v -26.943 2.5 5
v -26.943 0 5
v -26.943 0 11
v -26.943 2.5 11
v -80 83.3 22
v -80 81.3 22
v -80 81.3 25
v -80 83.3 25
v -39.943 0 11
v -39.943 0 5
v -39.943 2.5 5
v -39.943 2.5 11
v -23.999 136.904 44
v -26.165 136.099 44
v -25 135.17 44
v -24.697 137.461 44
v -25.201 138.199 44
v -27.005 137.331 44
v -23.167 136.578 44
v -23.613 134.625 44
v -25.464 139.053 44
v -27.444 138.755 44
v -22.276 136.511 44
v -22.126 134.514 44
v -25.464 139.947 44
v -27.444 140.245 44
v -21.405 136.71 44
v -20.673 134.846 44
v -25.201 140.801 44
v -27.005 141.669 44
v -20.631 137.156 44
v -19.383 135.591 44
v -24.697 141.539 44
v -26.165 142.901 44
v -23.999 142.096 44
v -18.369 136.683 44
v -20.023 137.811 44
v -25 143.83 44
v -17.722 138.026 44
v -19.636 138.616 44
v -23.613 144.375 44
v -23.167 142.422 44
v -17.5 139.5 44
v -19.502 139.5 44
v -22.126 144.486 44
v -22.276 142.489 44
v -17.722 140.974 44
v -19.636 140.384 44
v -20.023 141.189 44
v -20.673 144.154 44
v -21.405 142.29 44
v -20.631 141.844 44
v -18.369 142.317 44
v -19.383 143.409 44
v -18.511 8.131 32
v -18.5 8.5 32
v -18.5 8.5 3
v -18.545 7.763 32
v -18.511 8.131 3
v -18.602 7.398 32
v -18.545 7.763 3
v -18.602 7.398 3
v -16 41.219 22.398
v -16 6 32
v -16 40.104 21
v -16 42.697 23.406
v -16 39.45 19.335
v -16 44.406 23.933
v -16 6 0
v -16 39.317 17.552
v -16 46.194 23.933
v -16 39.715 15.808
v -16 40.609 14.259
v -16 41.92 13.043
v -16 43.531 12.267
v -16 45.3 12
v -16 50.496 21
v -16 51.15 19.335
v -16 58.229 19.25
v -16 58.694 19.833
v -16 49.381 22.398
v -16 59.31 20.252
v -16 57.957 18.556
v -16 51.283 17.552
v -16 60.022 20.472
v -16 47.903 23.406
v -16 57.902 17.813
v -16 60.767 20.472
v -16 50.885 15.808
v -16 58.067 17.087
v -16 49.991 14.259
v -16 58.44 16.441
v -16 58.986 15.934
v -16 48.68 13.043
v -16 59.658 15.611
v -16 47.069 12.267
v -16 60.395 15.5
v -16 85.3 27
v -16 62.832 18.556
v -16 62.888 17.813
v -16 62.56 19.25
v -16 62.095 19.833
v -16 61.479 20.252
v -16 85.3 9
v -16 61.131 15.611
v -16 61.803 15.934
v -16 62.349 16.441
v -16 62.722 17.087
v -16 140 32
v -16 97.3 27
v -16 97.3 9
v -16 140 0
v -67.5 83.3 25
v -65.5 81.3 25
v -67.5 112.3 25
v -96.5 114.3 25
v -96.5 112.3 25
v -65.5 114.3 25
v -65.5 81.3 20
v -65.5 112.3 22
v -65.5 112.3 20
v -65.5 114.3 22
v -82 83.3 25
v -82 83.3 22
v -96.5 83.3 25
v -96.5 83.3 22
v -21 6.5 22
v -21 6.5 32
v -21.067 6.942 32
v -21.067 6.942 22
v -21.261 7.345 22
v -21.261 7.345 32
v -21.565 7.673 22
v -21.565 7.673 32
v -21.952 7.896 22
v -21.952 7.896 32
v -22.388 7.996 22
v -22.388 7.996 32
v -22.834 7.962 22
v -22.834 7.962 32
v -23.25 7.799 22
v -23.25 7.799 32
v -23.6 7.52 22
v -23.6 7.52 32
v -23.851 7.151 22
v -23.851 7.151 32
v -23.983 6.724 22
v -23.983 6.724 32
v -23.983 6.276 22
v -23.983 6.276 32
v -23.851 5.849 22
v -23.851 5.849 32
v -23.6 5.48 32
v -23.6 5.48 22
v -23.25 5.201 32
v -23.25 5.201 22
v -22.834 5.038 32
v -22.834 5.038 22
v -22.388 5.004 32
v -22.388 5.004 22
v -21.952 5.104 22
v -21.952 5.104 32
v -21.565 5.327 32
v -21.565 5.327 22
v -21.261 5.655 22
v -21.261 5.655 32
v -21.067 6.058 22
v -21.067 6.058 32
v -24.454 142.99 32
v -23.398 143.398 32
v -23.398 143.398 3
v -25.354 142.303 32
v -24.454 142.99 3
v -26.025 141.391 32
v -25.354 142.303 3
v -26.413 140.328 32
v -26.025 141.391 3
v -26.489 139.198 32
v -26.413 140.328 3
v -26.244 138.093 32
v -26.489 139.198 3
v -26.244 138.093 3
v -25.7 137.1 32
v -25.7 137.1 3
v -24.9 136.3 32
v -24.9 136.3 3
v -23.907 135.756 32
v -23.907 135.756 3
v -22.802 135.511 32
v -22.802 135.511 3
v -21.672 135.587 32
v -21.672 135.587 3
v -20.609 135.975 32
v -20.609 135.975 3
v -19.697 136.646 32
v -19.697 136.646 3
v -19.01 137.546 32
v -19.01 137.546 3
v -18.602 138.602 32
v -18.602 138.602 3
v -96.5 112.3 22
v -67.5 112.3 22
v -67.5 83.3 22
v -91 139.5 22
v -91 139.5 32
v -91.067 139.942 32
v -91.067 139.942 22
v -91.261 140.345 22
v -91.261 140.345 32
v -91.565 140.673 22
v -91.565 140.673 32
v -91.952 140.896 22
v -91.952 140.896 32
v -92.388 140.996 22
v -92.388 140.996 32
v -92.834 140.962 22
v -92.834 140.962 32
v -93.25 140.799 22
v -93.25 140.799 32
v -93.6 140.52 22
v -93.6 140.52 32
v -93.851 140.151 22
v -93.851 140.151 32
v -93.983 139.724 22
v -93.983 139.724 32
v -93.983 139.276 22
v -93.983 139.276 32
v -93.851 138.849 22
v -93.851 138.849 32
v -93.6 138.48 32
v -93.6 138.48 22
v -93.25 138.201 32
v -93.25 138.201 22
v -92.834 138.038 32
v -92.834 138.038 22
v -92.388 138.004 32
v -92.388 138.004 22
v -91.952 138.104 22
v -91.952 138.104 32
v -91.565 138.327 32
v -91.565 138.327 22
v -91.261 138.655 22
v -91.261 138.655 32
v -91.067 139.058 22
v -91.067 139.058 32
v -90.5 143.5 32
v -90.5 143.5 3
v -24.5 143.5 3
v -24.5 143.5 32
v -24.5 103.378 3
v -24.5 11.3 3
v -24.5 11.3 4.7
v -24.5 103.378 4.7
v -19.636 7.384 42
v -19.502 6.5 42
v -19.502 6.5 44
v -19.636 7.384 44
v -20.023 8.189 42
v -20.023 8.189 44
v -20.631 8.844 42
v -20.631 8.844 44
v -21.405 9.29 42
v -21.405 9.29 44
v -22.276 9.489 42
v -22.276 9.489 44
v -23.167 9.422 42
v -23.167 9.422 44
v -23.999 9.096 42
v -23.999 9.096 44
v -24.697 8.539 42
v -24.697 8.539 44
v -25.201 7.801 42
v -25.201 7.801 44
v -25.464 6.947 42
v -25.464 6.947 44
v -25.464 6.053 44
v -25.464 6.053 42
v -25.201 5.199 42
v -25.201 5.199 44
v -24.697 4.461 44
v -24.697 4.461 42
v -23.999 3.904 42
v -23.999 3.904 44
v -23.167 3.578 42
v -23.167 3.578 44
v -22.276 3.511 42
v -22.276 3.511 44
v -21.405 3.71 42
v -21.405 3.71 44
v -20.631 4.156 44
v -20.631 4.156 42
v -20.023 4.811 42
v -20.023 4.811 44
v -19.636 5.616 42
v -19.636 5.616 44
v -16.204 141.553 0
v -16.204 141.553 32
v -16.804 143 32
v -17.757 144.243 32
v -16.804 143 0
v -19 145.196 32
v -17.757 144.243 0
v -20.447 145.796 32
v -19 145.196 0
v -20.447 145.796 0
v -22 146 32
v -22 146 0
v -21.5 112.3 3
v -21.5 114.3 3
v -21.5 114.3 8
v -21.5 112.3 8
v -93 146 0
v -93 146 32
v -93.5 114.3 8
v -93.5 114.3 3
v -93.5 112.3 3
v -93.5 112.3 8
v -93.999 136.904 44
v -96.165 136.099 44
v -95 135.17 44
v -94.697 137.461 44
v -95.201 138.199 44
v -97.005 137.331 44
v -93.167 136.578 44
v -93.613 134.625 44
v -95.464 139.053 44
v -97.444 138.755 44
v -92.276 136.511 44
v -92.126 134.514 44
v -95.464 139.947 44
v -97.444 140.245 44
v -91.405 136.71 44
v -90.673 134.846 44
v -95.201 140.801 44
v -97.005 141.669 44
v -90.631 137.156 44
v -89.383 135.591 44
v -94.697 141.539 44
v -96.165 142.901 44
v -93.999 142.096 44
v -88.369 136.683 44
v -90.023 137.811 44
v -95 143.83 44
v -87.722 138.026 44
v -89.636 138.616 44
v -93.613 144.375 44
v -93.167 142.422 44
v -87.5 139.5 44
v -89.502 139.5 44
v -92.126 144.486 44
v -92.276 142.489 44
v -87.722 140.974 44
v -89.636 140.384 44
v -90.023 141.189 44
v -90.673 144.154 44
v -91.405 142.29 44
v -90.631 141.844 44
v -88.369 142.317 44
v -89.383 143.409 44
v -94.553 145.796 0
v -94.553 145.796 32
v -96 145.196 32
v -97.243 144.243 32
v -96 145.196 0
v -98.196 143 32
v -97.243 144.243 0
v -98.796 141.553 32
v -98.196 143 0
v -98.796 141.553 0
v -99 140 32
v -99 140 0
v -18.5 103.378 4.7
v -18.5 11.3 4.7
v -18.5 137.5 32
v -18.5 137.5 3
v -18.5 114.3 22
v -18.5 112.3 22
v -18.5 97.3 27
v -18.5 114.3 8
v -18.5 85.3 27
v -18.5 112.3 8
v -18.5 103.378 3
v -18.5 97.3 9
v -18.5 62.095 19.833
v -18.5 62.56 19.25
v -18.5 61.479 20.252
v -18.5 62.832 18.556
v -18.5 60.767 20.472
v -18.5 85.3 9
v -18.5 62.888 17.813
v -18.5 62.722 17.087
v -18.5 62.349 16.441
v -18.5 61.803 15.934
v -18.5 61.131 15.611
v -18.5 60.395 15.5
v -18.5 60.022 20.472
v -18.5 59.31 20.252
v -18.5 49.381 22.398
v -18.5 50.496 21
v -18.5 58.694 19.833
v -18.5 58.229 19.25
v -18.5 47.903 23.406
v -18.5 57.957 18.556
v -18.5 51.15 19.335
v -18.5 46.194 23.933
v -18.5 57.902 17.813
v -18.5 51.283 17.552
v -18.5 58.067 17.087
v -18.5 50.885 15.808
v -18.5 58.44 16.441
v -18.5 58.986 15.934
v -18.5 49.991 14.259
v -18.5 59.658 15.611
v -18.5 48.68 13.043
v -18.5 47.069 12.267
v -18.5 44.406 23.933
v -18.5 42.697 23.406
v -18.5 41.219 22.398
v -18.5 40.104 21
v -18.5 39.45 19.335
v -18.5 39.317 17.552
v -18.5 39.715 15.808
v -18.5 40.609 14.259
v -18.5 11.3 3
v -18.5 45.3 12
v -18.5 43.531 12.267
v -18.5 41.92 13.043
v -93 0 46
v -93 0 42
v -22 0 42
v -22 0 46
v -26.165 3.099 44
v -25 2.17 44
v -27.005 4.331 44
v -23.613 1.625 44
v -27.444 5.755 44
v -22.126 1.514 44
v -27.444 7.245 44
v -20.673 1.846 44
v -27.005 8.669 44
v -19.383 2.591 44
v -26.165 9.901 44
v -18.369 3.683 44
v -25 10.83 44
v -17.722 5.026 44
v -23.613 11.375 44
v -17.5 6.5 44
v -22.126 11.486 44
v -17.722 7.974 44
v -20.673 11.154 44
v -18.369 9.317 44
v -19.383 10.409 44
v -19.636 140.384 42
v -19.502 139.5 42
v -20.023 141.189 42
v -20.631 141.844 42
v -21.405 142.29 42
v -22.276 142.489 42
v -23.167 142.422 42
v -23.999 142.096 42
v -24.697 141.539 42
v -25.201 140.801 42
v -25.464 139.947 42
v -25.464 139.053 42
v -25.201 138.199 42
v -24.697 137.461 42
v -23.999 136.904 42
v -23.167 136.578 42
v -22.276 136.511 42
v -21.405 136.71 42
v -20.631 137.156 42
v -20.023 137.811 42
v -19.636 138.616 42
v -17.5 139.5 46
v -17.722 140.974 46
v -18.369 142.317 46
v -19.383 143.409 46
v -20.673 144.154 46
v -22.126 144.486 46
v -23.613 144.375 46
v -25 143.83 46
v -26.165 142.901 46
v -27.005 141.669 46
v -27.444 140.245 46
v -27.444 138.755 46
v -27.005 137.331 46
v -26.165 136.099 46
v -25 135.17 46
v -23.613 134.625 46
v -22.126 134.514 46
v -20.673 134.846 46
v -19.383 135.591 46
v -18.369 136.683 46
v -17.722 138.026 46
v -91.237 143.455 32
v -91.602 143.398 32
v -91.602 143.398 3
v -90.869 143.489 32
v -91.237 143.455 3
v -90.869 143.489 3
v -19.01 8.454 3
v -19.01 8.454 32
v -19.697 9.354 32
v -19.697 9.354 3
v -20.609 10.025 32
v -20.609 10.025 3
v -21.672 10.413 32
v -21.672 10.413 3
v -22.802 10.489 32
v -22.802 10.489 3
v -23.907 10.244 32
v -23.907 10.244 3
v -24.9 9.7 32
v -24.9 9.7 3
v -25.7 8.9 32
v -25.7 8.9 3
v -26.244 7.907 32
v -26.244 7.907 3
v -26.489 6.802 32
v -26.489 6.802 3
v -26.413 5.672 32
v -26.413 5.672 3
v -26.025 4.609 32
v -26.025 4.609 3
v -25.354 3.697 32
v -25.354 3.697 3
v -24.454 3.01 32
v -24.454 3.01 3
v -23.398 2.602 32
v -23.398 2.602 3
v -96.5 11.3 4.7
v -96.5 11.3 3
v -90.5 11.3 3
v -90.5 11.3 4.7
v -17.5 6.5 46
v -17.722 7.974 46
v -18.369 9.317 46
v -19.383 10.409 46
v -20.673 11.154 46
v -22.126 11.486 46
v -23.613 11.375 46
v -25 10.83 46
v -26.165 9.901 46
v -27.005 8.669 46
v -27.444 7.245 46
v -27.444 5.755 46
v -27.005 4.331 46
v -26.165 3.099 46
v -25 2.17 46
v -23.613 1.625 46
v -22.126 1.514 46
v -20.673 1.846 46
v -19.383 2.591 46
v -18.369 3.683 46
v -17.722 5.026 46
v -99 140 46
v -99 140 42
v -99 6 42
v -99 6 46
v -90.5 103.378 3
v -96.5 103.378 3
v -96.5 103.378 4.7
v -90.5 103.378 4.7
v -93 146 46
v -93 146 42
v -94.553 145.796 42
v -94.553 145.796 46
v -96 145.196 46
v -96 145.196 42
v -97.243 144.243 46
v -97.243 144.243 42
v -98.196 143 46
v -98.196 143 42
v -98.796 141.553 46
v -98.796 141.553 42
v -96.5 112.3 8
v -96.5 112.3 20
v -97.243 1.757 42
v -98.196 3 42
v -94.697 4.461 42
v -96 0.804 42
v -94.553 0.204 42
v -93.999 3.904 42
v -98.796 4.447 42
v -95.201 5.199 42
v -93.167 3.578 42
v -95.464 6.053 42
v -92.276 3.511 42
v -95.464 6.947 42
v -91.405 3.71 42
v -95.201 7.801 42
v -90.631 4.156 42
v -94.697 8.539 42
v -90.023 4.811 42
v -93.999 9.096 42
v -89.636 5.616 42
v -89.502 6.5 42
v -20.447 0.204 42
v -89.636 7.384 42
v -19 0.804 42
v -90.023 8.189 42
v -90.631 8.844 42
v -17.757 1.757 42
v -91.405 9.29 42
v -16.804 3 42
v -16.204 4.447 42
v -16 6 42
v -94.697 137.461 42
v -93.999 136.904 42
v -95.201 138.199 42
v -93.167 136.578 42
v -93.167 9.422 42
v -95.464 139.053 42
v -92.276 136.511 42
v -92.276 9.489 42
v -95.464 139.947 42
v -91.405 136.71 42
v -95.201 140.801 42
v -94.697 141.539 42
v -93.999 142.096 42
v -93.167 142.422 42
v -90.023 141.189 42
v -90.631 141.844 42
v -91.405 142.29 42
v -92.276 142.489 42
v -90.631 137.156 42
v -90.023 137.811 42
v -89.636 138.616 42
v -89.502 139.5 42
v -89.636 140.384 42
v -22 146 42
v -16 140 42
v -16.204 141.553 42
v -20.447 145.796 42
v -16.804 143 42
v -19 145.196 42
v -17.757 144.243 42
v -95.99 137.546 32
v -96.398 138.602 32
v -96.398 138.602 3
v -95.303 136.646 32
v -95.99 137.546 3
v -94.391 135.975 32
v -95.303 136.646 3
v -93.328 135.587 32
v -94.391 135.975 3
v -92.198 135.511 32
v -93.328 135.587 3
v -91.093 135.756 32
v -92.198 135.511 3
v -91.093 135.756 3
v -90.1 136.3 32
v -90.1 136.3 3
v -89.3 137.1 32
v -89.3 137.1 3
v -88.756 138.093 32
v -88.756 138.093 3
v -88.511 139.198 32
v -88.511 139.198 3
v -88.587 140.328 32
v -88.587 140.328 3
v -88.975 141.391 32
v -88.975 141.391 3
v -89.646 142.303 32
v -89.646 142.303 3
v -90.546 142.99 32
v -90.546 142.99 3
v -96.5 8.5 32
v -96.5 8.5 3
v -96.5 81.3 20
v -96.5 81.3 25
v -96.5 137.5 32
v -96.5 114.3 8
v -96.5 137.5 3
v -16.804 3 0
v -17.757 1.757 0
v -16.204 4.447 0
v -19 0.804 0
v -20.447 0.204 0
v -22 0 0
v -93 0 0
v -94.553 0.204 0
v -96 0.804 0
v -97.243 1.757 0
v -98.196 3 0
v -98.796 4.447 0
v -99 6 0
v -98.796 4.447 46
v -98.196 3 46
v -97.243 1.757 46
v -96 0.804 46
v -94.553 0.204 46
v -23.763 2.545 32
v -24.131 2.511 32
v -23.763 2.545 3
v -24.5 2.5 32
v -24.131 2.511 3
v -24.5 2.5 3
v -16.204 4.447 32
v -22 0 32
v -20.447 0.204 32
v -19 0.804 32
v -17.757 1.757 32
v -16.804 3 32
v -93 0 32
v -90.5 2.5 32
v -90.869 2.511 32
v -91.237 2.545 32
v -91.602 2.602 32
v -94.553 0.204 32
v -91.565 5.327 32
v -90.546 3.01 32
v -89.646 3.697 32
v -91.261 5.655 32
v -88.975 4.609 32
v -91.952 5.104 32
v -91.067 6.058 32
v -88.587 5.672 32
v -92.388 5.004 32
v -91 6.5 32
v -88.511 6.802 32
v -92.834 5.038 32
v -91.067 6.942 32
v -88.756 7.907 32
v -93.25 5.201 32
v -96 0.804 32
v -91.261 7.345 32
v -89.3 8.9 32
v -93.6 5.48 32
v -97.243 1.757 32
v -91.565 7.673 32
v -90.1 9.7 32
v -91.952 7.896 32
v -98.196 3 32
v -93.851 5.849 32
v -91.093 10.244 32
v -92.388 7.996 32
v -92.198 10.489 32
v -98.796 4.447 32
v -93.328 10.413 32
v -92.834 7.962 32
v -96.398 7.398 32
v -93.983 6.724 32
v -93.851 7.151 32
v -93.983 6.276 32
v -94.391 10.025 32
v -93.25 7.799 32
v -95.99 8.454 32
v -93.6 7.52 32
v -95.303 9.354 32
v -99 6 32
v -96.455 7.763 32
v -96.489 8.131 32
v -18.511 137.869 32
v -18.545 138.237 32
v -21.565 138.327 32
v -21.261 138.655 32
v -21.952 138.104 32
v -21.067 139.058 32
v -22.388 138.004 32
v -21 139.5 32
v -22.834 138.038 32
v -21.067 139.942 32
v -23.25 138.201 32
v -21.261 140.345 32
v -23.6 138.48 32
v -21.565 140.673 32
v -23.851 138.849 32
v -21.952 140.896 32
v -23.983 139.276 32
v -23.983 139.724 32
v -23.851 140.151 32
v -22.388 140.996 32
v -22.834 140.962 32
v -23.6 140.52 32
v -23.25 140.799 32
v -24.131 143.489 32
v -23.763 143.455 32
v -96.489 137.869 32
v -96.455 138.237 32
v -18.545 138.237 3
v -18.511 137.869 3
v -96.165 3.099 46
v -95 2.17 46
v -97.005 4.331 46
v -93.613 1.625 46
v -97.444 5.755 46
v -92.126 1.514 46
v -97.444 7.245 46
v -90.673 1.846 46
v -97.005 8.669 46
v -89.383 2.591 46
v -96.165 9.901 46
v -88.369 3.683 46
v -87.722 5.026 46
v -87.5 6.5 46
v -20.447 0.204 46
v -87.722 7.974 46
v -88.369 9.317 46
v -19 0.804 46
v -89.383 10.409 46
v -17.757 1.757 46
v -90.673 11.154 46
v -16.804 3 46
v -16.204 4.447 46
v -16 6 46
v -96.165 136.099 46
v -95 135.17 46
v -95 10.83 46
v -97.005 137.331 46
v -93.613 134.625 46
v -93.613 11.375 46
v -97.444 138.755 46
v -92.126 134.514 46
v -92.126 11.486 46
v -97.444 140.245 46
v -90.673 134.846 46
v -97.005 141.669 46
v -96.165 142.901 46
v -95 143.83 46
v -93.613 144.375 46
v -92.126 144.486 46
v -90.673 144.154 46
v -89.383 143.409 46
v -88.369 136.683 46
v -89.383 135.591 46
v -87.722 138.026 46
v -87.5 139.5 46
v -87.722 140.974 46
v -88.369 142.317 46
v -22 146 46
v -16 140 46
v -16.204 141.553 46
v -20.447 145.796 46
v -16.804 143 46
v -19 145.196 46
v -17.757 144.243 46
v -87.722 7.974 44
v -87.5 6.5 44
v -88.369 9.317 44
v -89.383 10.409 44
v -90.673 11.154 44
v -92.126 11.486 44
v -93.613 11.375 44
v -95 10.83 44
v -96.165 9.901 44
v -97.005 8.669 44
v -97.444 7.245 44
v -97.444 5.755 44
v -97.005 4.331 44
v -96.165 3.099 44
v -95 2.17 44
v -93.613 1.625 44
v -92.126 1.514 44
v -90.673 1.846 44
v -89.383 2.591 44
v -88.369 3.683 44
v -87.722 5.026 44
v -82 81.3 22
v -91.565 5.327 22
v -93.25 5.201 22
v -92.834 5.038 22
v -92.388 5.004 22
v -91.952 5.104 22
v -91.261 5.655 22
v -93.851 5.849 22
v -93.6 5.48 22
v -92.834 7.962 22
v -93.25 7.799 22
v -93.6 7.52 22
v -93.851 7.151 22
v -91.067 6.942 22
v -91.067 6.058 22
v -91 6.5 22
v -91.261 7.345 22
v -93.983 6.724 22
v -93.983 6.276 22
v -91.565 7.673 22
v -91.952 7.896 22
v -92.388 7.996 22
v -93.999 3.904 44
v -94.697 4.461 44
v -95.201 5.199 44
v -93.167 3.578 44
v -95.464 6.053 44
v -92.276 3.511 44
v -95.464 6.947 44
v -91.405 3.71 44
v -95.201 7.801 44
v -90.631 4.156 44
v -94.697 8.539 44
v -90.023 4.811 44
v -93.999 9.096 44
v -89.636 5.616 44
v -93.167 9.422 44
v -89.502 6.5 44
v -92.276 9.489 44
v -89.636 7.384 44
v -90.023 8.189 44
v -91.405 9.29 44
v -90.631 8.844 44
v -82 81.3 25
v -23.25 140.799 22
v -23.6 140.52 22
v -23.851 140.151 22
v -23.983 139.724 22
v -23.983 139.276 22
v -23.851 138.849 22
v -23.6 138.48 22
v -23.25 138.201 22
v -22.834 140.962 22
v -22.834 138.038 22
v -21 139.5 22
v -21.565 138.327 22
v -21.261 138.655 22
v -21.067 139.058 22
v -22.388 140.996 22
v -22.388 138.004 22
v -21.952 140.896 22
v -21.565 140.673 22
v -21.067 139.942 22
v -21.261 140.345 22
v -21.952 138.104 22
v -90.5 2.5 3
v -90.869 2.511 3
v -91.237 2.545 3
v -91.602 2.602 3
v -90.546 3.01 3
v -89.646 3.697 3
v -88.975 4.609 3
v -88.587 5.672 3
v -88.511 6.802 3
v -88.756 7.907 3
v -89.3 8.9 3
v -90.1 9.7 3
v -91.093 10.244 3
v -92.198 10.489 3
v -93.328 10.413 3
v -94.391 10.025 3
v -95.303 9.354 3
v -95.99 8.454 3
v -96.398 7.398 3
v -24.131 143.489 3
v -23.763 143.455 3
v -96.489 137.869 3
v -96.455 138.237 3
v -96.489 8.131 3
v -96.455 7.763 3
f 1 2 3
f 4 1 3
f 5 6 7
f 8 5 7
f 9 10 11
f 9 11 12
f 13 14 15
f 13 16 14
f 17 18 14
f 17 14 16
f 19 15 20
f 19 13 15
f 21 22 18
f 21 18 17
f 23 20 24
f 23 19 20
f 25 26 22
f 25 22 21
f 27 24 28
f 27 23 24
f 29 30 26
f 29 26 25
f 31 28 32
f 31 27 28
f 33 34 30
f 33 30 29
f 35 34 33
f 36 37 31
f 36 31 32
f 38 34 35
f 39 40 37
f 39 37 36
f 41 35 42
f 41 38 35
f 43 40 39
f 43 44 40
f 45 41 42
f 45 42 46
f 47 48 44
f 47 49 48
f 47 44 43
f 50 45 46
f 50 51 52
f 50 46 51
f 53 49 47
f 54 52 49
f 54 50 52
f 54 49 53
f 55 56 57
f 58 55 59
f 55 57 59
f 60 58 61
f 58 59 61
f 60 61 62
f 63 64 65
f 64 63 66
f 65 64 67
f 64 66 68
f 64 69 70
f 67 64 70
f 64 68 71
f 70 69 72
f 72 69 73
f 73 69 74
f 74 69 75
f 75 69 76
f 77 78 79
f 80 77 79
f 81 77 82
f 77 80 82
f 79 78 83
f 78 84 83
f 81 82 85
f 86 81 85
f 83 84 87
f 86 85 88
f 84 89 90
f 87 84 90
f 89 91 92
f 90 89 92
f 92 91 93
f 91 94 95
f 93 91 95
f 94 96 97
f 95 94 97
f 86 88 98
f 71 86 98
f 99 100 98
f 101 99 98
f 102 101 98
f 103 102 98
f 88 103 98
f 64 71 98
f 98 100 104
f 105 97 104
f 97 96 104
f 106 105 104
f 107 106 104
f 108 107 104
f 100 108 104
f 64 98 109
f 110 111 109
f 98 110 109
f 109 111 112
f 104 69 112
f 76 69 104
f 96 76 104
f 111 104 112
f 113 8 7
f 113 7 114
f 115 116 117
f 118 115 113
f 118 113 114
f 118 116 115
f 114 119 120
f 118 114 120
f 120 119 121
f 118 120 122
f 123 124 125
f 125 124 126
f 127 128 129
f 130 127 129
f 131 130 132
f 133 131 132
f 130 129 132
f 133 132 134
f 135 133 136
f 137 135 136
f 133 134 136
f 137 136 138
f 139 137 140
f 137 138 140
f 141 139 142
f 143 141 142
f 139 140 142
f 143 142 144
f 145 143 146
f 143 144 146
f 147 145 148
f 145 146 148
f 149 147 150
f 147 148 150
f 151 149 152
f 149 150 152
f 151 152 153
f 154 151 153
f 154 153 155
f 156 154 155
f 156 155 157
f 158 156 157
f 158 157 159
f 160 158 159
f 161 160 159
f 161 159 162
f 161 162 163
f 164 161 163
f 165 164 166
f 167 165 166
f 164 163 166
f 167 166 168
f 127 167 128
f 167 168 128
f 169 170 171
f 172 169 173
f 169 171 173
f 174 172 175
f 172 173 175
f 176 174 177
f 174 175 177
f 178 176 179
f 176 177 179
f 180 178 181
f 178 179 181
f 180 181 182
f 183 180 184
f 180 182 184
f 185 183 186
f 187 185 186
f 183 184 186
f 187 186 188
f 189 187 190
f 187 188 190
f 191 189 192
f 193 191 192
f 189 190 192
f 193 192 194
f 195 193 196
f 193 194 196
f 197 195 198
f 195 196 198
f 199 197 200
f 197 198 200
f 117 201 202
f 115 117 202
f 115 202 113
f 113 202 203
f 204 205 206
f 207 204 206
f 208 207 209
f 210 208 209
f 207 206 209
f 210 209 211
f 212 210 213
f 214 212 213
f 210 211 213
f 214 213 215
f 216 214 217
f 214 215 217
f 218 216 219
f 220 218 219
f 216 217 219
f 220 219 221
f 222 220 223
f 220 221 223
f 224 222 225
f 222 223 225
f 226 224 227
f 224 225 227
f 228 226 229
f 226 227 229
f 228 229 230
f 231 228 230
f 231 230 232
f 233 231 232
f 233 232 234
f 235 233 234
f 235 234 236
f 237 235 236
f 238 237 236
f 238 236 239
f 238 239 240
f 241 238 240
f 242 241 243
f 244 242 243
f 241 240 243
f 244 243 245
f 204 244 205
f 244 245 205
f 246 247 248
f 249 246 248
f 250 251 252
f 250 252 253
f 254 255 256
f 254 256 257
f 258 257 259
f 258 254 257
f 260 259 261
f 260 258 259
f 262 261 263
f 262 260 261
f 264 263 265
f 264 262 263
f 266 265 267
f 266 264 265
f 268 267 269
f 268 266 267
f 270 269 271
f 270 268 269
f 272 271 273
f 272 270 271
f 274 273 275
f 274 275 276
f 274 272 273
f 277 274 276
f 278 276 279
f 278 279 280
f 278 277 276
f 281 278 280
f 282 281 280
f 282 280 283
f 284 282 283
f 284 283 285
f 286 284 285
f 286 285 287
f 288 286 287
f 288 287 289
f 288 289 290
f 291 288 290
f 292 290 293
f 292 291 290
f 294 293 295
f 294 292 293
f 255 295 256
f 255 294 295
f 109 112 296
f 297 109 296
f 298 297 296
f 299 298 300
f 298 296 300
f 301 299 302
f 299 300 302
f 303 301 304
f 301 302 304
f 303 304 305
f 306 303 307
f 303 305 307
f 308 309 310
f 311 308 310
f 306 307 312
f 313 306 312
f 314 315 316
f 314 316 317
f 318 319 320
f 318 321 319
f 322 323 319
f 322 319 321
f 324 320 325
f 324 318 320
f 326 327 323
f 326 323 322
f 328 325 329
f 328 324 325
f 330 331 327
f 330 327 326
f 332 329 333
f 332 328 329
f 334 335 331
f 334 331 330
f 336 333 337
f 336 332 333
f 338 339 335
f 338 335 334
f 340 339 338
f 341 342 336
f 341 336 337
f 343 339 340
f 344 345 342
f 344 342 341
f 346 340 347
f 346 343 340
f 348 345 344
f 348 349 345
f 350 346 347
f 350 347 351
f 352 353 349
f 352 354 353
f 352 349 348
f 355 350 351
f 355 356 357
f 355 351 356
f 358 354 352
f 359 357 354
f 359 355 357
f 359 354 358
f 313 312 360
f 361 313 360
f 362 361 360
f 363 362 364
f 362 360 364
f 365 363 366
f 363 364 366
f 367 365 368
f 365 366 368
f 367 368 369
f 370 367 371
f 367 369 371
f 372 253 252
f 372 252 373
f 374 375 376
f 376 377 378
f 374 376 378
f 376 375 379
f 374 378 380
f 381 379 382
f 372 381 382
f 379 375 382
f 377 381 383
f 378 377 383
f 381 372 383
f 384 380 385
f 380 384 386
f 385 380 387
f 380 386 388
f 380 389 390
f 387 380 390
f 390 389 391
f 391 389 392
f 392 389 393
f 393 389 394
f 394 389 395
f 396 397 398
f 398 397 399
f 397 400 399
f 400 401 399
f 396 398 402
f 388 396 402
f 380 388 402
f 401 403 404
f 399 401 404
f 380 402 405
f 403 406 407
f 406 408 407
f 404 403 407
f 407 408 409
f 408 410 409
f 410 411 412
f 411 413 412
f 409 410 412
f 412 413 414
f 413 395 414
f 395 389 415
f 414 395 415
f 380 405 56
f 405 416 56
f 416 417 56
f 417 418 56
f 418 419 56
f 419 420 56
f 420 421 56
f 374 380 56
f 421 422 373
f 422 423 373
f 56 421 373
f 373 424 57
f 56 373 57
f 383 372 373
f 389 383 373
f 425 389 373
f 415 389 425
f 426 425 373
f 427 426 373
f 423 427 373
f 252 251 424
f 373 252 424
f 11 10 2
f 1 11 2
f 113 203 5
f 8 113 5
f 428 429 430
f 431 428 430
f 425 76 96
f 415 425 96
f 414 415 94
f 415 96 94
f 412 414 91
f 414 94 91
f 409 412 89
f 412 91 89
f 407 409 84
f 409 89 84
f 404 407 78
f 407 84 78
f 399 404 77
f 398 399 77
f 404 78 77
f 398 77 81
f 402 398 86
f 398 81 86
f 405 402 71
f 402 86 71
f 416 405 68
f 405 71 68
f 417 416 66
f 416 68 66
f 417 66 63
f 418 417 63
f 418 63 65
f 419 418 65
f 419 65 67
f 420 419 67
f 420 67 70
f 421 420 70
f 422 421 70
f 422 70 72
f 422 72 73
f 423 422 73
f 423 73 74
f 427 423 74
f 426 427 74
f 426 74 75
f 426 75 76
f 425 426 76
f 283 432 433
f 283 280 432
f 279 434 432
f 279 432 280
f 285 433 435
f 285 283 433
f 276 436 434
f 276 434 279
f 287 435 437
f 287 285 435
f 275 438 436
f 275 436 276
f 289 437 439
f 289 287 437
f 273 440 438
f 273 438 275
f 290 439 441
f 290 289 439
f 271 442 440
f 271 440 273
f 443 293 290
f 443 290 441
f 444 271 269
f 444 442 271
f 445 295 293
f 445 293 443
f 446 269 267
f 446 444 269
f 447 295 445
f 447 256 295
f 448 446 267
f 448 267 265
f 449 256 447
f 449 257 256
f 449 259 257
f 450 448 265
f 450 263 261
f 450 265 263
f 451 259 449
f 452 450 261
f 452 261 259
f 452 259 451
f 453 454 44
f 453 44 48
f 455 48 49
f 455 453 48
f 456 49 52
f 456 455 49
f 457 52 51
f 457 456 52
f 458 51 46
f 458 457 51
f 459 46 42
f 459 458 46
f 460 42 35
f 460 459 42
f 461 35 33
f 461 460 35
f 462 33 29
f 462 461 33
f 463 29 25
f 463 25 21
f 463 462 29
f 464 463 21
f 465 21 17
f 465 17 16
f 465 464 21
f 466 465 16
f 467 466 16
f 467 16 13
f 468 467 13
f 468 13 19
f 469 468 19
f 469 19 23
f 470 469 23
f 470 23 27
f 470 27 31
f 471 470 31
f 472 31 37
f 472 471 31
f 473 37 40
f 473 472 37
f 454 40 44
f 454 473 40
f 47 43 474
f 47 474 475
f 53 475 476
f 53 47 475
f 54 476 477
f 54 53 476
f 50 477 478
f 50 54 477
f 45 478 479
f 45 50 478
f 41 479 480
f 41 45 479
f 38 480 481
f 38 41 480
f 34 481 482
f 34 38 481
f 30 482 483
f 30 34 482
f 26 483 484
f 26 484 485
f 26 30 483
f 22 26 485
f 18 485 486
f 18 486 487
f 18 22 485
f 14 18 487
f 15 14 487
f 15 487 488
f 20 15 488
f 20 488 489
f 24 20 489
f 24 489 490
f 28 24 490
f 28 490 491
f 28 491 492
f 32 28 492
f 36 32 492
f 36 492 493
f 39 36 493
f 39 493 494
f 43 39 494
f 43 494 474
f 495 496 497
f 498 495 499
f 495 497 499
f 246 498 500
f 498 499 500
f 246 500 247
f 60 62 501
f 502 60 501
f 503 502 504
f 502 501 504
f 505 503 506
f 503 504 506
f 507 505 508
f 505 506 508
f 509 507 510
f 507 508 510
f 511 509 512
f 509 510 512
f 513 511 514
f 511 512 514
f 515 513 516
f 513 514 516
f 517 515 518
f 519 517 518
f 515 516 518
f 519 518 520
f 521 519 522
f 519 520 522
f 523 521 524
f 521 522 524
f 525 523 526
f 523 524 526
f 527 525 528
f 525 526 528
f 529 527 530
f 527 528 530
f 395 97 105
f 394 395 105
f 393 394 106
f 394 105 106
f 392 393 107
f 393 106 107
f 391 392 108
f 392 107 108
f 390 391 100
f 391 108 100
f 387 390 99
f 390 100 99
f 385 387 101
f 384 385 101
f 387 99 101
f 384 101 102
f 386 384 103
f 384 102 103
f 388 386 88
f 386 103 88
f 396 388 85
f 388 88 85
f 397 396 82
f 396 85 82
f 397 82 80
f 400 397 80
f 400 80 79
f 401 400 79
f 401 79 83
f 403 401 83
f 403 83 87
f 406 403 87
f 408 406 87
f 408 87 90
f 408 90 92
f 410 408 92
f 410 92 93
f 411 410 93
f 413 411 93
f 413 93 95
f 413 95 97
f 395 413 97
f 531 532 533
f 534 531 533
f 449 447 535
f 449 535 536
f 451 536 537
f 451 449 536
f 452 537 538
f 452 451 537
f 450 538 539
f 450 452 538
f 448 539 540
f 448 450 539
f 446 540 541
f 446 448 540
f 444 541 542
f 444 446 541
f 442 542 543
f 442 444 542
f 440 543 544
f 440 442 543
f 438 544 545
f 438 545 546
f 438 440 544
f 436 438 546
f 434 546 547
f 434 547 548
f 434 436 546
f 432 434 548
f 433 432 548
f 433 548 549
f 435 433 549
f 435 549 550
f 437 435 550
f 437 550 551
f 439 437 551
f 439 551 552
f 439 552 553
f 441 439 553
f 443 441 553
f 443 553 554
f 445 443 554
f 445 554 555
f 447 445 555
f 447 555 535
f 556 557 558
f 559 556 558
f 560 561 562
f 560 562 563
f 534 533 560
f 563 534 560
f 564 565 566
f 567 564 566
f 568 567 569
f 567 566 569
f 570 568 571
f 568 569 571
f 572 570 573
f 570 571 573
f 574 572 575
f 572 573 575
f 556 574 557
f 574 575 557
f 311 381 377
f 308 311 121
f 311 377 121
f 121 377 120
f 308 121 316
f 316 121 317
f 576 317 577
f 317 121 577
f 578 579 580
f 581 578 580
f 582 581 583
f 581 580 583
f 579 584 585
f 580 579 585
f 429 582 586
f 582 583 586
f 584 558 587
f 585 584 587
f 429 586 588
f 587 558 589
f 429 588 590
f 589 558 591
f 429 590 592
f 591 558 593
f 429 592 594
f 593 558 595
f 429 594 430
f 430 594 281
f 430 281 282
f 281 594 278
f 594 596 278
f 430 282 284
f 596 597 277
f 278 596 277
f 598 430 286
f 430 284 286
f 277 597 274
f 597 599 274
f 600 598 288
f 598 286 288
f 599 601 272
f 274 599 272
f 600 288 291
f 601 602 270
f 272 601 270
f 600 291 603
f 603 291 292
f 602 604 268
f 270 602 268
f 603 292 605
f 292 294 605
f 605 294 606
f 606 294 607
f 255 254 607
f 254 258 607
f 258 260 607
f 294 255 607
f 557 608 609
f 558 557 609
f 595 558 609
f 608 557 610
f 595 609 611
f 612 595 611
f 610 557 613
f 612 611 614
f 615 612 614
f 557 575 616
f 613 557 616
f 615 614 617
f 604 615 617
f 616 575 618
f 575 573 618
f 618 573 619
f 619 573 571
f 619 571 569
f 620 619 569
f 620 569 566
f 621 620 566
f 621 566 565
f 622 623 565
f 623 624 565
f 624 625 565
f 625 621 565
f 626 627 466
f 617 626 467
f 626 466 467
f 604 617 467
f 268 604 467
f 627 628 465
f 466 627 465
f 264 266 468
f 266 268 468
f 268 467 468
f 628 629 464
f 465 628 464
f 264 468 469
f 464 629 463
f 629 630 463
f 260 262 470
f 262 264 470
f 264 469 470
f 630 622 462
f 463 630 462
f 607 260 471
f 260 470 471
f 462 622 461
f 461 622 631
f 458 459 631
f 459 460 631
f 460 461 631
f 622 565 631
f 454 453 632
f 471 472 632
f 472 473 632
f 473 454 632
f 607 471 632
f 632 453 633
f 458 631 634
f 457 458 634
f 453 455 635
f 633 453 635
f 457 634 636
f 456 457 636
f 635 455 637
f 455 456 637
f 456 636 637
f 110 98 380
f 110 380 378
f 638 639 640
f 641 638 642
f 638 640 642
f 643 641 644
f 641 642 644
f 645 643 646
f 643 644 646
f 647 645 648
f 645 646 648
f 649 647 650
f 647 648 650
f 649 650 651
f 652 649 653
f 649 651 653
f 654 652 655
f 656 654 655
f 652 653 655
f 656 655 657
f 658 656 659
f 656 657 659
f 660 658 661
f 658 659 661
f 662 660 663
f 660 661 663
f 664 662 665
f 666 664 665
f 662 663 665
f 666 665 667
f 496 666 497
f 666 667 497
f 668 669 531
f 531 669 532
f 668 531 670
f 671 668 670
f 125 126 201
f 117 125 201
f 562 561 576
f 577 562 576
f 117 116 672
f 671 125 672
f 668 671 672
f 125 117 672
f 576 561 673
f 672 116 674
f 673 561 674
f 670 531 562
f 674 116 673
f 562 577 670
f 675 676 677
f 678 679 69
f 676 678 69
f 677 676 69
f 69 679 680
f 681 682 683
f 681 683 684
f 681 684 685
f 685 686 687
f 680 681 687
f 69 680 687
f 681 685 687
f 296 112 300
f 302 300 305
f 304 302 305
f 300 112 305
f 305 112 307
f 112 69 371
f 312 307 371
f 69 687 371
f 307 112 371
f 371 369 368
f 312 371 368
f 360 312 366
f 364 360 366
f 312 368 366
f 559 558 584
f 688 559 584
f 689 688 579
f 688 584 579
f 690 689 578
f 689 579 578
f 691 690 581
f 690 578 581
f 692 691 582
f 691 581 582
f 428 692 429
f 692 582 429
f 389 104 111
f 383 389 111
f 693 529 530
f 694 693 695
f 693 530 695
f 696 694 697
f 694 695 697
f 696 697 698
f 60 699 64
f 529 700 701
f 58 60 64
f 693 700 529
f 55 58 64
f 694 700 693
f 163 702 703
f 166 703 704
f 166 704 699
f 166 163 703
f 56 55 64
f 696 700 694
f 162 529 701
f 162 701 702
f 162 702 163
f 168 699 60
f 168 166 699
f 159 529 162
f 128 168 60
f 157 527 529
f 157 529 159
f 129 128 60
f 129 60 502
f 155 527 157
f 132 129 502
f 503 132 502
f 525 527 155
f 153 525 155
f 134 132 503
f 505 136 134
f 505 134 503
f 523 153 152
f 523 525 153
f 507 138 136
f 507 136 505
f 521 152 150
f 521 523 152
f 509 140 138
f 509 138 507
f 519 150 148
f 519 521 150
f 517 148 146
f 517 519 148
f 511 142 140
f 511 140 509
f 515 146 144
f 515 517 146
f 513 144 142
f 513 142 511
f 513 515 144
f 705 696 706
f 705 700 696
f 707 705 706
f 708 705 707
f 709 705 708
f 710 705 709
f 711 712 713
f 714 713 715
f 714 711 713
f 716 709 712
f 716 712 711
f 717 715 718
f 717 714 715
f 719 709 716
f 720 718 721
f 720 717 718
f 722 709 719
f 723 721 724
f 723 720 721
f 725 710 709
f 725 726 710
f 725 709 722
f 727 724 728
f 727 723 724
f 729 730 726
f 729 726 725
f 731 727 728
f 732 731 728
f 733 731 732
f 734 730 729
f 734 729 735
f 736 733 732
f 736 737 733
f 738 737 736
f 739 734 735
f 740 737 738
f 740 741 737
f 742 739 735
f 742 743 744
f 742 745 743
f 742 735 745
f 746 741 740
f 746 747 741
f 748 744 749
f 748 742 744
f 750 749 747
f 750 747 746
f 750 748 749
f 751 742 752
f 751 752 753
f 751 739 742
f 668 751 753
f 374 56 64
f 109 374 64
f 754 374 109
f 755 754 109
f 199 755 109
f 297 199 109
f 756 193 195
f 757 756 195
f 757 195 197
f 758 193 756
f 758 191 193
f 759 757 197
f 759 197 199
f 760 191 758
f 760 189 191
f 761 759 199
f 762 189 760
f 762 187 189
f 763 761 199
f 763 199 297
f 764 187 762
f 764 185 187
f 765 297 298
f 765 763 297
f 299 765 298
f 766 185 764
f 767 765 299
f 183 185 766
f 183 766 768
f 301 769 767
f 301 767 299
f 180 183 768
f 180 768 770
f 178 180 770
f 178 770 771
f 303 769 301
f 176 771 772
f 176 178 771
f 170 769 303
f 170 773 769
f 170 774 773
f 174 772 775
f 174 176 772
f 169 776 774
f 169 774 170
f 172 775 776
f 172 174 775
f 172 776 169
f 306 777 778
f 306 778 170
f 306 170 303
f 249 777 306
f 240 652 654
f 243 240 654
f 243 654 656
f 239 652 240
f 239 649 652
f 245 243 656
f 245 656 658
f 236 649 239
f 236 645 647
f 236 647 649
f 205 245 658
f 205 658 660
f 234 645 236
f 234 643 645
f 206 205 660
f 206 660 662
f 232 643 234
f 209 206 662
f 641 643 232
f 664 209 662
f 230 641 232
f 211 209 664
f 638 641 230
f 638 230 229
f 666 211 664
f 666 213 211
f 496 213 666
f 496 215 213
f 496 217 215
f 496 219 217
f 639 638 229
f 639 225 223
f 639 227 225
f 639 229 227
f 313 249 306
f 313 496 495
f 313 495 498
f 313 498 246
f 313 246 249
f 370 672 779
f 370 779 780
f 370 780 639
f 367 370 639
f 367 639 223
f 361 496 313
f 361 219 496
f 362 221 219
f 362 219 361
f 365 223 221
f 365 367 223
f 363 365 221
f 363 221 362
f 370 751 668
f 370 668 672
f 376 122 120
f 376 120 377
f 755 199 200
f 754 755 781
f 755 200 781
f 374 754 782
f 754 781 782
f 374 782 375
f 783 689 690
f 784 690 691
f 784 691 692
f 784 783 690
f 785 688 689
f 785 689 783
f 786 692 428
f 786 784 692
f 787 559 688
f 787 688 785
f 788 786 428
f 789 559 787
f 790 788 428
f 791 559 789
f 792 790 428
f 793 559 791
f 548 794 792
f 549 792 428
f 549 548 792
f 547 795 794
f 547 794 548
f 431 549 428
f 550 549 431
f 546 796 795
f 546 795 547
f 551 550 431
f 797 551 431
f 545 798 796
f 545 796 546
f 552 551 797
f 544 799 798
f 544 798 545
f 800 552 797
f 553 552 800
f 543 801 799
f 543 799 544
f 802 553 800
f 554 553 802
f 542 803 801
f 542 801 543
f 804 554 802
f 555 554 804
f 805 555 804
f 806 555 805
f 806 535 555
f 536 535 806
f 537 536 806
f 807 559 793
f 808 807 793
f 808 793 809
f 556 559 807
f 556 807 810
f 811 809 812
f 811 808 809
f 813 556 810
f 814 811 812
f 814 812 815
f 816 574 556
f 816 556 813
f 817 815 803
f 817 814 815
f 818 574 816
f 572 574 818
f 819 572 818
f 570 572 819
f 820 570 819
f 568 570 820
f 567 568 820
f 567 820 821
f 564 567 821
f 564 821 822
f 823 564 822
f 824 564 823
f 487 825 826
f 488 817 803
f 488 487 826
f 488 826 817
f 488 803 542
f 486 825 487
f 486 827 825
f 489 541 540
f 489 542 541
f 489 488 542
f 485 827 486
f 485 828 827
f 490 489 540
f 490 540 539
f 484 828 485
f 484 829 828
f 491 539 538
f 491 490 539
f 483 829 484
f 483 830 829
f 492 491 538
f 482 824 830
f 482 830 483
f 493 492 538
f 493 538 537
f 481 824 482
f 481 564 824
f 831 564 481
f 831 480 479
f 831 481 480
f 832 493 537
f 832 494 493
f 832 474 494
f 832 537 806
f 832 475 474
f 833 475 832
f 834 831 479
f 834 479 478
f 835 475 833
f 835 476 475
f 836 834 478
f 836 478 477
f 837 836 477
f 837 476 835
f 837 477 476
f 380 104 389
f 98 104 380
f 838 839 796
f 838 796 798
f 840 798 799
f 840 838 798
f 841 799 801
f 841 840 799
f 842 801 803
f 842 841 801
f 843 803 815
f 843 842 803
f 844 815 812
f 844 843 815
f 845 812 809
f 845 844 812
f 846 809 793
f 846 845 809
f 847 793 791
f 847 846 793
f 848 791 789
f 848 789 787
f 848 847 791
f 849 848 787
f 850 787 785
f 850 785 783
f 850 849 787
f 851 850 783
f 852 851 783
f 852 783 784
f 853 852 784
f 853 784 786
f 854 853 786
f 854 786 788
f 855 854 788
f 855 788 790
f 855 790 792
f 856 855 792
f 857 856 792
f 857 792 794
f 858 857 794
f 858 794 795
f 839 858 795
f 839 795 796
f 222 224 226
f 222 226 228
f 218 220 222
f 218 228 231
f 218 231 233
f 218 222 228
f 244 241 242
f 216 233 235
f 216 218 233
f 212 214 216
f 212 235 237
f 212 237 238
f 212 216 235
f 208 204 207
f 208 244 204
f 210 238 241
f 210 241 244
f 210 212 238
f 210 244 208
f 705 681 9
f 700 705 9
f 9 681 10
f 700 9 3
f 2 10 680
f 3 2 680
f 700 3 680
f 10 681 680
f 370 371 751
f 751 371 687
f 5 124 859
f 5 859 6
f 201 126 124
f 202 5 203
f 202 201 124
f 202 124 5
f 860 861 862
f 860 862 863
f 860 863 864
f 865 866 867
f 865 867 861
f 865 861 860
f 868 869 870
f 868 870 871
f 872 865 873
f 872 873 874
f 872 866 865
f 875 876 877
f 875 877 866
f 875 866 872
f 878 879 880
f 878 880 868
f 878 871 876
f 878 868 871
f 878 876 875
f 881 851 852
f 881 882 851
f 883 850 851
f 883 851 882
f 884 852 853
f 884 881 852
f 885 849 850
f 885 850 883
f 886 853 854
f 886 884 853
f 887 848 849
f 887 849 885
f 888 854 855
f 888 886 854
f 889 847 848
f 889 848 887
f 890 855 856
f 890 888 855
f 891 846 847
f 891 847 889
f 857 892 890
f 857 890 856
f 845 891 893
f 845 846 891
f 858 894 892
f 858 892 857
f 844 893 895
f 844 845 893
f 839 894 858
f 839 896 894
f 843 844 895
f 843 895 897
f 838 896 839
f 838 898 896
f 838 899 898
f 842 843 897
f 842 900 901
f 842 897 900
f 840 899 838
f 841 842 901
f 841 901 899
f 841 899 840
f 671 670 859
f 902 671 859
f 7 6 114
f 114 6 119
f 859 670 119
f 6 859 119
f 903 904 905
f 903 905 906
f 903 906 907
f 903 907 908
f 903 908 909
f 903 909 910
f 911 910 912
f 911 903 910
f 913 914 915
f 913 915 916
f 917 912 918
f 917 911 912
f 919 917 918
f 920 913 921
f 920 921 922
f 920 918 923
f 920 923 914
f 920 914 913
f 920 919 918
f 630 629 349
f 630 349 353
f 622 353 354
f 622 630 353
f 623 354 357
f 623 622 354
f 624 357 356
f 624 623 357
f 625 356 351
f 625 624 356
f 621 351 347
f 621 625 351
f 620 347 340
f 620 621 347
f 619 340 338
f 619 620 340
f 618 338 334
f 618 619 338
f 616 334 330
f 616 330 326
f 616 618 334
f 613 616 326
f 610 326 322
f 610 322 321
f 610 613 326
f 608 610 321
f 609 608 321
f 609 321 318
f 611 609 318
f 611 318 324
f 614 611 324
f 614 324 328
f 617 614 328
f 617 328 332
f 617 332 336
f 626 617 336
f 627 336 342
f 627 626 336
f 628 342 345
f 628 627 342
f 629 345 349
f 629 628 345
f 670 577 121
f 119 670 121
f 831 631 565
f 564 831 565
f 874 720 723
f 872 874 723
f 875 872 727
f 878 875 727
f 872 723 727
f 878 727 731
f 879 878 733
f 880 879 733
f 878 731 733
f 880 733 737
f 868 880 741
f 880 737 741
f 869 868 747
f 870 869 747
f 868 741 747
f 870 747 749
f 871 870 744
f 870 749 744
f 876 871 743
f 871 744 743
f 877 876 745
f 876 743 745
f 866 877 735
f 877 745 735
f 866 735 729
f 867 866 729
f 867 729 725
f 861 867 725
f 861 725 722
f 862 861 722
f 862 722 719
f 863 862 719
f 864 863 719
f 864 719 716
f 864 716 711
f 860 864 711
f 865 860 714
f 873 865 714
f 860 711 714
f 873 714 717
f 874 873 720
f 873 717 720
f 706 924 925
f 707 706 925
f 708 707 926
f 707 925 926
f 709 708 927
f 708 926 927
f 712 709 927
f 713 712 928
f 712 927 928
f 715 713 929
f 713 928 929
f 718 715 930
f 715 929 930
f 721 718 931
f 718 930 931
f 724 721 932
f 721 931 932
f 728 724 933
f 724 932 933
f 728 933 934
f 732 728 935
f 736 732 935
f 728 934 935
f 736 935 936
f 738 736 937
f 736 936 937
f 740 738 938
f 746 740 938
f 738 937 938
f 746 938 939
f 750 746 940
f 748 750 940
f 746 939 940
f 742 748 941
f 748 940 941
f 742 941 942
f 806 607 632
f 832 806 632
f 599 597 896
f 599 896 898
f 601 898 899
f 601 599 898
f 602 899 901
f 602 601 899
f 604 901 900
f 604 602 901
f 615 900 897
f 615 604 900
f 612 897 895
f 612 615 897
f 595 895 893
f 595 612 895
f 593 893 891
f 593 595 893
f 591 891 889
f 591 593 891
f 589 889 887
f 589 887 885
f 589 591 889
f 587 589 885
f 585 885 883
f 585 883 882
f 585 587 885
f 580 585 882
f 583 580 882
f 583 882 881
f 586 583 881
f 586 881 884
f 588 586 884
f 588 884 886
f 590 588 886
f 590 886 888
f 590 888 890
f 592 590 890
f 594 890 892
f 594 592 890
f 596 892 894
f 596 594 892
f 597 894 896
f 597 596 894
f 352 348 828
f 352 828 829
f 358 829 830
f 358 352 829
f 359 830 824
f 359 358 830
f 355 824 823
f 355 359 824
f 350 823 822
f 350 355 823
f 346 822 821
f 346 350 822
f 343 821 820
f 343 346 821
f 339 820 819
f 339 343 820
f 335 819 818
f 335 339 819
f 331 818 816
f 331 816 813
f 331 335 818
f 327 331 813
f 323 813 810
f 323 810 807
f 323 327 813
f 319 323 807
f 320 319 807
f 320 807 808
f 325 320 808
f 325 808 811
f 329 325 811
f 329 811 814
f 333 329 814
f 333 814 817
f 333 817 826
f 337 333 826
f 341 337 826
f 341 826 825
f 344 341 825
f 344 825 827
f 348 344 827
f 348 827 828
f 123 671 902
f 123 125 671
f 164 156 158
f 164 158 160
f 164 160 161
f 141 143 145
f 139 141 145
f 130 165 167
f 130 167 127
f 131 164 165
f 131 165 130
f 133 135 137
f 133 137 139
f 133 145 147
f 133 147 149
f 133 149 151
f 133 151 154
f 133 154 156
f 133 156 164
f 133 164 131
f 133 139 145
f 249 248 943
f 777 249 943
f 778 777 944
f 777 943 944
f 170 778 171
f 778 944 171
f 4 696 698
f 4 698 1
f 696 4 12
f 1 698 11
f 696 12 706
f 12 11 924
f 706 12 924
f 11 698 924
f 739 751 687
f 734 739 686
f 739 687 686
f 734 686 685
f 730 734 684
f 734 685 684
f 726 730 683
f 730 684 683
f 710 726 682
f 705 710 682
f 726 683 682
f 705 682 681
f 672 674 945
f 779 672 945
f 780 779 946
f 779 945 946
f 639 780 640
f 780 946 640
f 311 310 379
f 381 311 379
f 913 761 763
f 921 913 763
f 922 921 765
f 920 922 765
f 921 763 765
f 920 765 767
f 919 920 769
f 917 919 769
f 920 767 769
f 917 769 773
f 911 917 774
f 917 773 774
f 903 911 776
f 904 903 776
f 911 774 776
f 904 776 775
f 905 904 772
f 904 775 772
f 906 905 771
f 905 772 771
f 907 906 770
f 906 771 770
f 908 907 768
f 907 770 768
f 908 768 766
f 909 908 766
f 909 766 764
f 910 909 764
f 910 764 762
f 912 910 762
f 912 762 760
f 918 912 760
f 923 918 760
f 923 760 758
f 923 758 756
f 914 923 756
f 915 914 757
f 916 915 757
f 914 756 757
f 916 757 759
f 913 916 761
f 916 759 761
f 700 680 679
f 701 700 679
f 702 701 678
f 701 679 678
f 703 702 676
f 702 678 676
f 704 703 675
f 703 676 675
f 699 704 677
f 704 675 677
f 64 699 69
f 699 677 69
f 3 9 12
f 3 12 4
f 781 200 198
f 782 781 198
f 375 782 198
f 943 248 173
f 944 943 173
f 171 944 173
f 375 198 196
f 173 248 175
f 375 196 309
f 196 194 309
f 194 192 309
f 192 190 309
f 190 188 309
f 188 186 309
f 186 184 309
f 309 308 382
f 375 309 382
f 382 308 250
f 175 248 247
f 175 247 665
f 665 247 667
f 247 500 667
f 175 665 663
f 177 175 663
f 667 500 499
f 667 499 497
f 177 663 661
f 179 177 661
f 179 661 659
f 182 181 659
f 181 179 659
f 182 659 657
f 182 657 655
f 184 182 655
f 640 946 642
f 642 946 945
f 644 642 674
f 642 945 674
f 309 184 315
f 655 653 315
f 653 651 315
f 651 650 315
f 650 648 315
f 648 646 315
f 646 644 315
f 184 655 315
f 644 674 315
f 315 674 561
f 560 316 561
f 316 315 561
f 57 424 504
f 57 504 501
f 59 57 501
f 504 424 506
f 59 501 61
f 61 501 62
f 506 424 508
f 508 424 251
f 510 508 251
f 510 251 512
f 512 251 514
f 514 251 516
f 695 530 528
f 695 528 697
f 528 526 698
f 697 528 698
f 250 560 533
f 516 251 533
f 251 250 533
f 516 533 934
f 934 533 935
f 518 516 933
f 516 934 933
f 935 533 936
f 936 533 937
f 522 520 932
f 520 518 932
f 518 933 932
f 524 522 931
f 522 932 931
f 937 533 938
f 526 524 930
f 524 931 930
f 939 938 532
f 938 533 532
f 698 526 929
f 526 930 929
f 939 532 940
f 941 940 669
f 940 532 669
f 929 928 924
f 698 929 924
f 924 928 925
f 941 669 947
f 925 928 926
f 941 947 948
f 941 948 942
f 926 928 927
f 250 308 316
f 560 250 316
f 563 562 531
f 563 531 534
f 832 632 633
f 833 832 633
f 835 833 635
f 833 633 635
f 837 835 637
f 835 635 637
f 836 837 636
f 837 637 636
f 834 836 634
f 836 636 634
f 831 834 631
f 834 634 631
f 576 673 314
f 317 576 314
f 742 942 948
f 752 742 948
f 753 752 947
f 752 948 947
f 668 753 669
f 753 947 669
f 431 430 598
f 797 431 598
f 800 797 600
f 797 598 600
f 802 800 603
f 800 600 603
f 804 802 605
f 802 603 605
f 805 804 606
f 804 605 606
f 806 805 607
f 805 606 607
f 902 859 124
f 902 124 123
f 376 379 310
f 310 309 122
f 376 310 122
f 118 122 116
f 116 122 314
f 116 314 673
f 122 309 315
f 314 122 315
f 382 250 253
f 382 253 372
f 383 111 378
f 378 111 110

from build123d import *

# Parameters (mm, degrees)
BOX_BASE_DEPTH              = 3
BOX_WALLS_DEPTH             = 32
SCREW_PLATFORMS_DEPTH       = 32
BATTERY_START               = 10
BATTERY_COMPARTMENT_DEPTH   = 19
CUT_EXTRUDE1_DEPTH          = 3
CUT_EXTRUDE1_DEPTH_BACK     = 6
SKETCH5_W                   = 3
SKETCH5_H                   = 5
BOX_START                   = 10
SKETCH6_R                   = 5
BOX_COVER_DEPTH             = 4
BOSS_EXTRUDE11_START        = 10
SKETCH6_3_R                 = 5
SKETCH6_3_R_2               = 2.99754368
BOSS_EXTRUDE11_DEPTH        = 2
SKETCH8_W                   = 6
SKETCH8_H                   = 92.078446576
REST_PLATFORM_DEPTH         = 1.7
SKETCH9_R                   = 6
SKETCH9_R_2                 = 2.5
SKETCH9_W                   = 12
SKETCH9_H                   = 18
BUTTTON_HOLES_DEPTH         = 4
SKETCH10_W                  = 13
SKETCH10_H                  = 6
FAKE_USB_DEPTH              = 4
GPS_START                   = -10
SKETCH11_W                  = 29
SKETCH11_H                  = 29
GPS_ANTENNA_BOX_DEPTH       = 2
GPS_START_2                 = -12
GPS_ANTENNA_BOX_WALLS_DEPTH = 5
SKETCH12_W                  = 2
SKETCH12_H                  = 3
CUT_EXTRUDE4_DEPTH          = 4
SKETCH6_4_R                 = 1.5
CUT_EXTRUDE5_DEPTH          = 10


with BuildPart() as part:
    # Sketch2 → box base (new body)
    with BuildSketch(Plane(origin=(0, 0, 0), x_dir=(0, 1, 0), z_dir=(0, 0, 1))):
        with BuildLine():
            Line((2.5, 24.5), (2.5, 90.5))
            ThreePointArc((2.5, 90.5), (4.257359313, 94.742640687), (8.5, 96.5))
            Line((8.5, 96.5), (137.5, 96.5))
            ThreePointArc((137.5, 96.5), (141.742640687, 94.742640687), (143.5, 90.5))
            Line((143.5, 90.5), (143.5, 24.5))
            ThreePointArc((143.5, 24.5), (141.742640687, 20.257359313), (137.5, 18.5))
            Line((137.5, 18.5), (8.5, 18.5))
            ThreePointArc((8.5, 18.5), (4.257359313, 20.257359313), (2.5, 24.5))
        make_face()
    extrude(amount=BOX_BASE_DEPTH)

    # Sketch2<3> → box walls (add)
    with BuildSketch(Plane(origin=(0, 0, 0), x_dir=(0, 1, 0), z_dir=(0, 0, 1))):
        with BuildLine():
            Line((6, 16), (140, 16))
            ThreePointArc((140, 16), (144.242640687, 17.757359313), (146, 22))
            Line((146, 22), (146, 93))
            ThreePointArc((146, 93), (144.242640687, 97.242640687), (140, 99))
            Line((140, 99), (6, 99))
            ThreePointArc((6, 99), (1.757359313, 97.242640687), (0, 93))
            Line((0, 93), (0, 22))
            ThreePointArc((0, 22), (1.757359313, 17.757359313), (6, 16))
        make_face()
        with BuildLine():
            Line((2.5, 24.5), (2.5, 90.5))
            ThreePointArc((2.5, 90.5), (4.257359313, 94.742640687), (8.5, 96.5))
            Line((8.5, 96.5), (137.5, 96.5))
            ThreePointArc((137.5, 96.5), (141.742640687, 94.742640687), (143.5, 90.5))
            Line((143.5, 90.5), (143.5, 24.5))
            ThreePointArc((143.5, 24.5), (141.742640687, 20.257359313), (137.5, 18.5))
            Line((137.5, 18.5), (8.5, 18.5))
            ThreePointArc((8.5, 18.5), (4.257359313, 20.257359313), (2.5, 24.5))
        make_face(mode=Mode.SUBTRACT)
    extrude(amount=BOX_WALLS_DEPTH)

    # Sketch2<4> → screw platforms (add)
    with BuildSketch(Plane(origin=(0, 0, 0), x_dir=(0, 1, 0), z_dir=(0, 0, 1))):
        with BuildLine():
            ThreePointArc((7.397915762, 96.397915762), (4.257359313, 94.742640687), (2.602084238, 91.602084238))
            ThreePointArc((2.602084238, 91.602084238), (9.328427125, 89.671572875), (7.397915762, 96.397915762))
        make_face()
        with BuildLine():
            ThreePointArc((7.397915762, 18.602084238), (9.328427125, 25.328427125), (2.602084238, 23.397915762))
            ThreePointArc((2.602084238, 23.397915762), (4.257359313, 20.257359313), (7.397915762, 18.602084238))
        make_face()
        with BuildLine():
            ThreePointArc((143.397915762, 91.602084238), (141.742640687, 94.742640687), (138.602084238, 96.397915762))
            ThreePointArc((138.602084238, 96.397915762), (136.671572875, 89.671572875), (143.397915762, 91.602084238))
        make_face()
        with BuildLine():
            ThreePointArc((143.397915762, 23.397915762), (136.671572875, 25.328427125), (138.602084238, 18.602084238))
            ThreePointArc((138.602084238, 18.602084238), (141.742640687, 20.257359313), (143.397915762, 23.397915762))
        make_face()
    extrude(amount=SCREW_PLATFORMS_DEPTH)

    # Sketch3 → battery compartment (add)
    with BuildSketch(Plane(origin=(-67, 0, 32), x_dir=(0, -1, 0), z_dir=(0, 0, -1)).offset(BATTERY_START)):
        Polygon((-114.3, -45.238614765), (-114.3, -48.5), (-112.3, -48.5), (-112.3, 29.5), (-114.3, 29.5), align=None)
    extrude(amount=BATTERY_COMPARTMENT_DEPTH)

    # Sketch5 → Cut-Extrude1 (cut, two sides: drawn at the far end of the back side and taken through both)
    with BuildSketch(Plane.XZ.offset(-112.3).offset(-CUT_EXTRUDE1_DEPTH_BACK)):
        with Locations((-95, 5.5)):
            Rectangle(SKETCH5_W, SKETCH5_H)
        with Locations((-20, 5.5)):
            Rectangle(SKETCH5_W, SKETCH5_H)
    extrude(amount=CUT_EXTRUDE1_DEPTH + CUT_EXTRUDE1_DEPTH_BACK, mode=Mode.SUBTRACT)

    # Sketch8 → rest platform (add)
    with BuildSketch(Plane.XY.offset(3)):
        with Locations((-21.5, 57.339223288)):
            Rectangle(SKETCH8_W, SKETCH8_H)
        with Locations((-93.5, 57.339223288)):
            Rectangle(SKETCH8_W, SKETCH8_H)
    extrude(amount=REST_PLATFORM_DEPTH)

    # Sketch9 → buttton holes (cut)
    with BuildSketch(Plane.YZ.offset(-16)):
        with Locations(Location((45.3, 18, 0), (0, 0, 270))):
            Circle(SKETCH9_R)
        with Locations(Location((60.394515887, 18, 0), (0, 0, 270))):
            Circle(SKETCH9_R_2)
        with Locations((91.3, 18)):
            Rectangle(SKETCH9_W, SKETCH9_H)
    extrude(amount=-BUTTTON_HOLES_DEPTH, mode=Mode.SUBTRACT)

    # Sketch10 → fake usb (cut)
    with BuildSketch(Plane.XZ):
        with Locations((-33.442978121, 8)):
            Rectangle(SKETCH10_W, SKETCH10_H)
    extrude(amount=-FAKE_USB_DEPTH, mode=Mode.SUBTRACT)

    # Sketch11 → gps antenna box (add)
    with BuildSketch(Plane.XY.offset(32).offset(GPS_START)):
        with Locations((-82, 97.8)):
            Rectangle(SKETCH11_W, SKETCH11_H)
    extrude(amount=-GPS_ANTENNA_BOX_DEPTH)

    # Sketch11<4> → gps antenna box walls (add)
    with BuildSketch(Plane.XY.offset(32).offset(GPS_START_2)):
        Polygon((-96.5, 114.3), (-96.5, 112.3), (-67.5, 112.3), (-67.5, 83.3), (-96.5, 83.3), (-96.5, 81.3), (-65.5, 81.3), (-65.5, 112.3), (-65.5, 114.3), (-67.5, 114.3), align=None)
    extrude(amount=GPS_ANTENNA_BOX_WALLS_DEPTH)

    # Sketch12 → Cut-Extrude4 (cut)
    with BuildSketch(Plane.XZ.offset(-81.3)):
        with Locations((-81, 23.5)):
            Rectangle(SKETCH12_W, SKETCH12_H)
    extrude(amount=-CUT_EXTRUDE4_DEPTH, mode=Mode.SUBTRACT)

    # Sketch6<4> → Cut-Extrude5 (cut)
    with BuildSketch(Plane.XY.offset(32)):
        with Locations((-92.5, 139.5)):
            Circle(SKETCH6_4_R)
        with Locations((-22.5, 139.5)):
            Circle(SKETCH6_4_R)
        with Locations((-22.5, 6.5)):
            Circle(SKETCH6_4_R)
        with Locations((-92.5, 6.5)):
            Circle(SKETCH6_4_R)
    extrude(amount=-CUT_EXTRUDE5_DEPTH, mode=Mode.SUBTRACT)


with BuildPart() as body_2:
    # Sketch6 → box cover (new body)
    with BuildSketch(Plane.XY.offset(32).offset(BOX_START)):
        with BuildLine():
            Line((-16, 6), (-16, 140))
            ThreePointArc((-16, 140), (-17.757359313, 144.242640687), (-22, 146))
            Line((-22, 146), (-93, 146))
            ThreePointArc((-93, 146), (-97.242640687, 144.242640687), (-99, 140))
            Line((-99, 140), (-99, 6))
            ThreePointArc((-99, 6), (-97.242640687, 1.757359313), (-93, 0))
            Line((-93, 0), (-22, 0))
            ThreePointArc((-22, 0), (-17.757359313, 1.757359313), (-16, 6))
        make_face()
        with Locations((-92.5, 139.5)):
            Circle(SKETCH6_R, mode=Mode.SUBTRACT)
        with Locations((-22.5, 139.5)):
            Circle(SKETCH6_R, mode=Mode.SUBTRACT)
        with Locations((-22.5, 6.5)):
            Circle(SKETCH6_R, mode=Mode.SUBTRACT)
        with Locations((-92.5, 6.5)):
            Circle(SKETCH6_R, mode=Mode.SUBTRACT)
    extrude(amount=BOX_COVER_DEPTH)

    # Sketch6<3> → Boss-Extrude11 (add)
    # profile 1 of 4: a face of its own
    with BuildSketch(Plane.XY.offset(32).offset(BOSS_EXTRUDE11_START)):
        with Locations((-22.5, 139.5)):
            Circle(SKETCH6_3_R)
        with Locations((-22.5, 139.5)):
            Circle(SKETCH6_3_R_2, mode=Mode.SUBTRACT)
    # profile 2 of 4: a face of its own
    with BuildSketch(Plane.XY.offset(32).offset(BOSS_EXTRUDE11_START)):
        with Locations((-92.5, 139.5)):
            Circle(SKETCH6_3_R)
        with Locations((-92.5, 139.5)):
            Circle(SKETCH6_3_R_2, mode=Mode.SUBTRACT)
    # profile 3 of 4: a face of its own
    with BuildSketch(Plane.XY.offset(32).offset(BOSS_EXTRUDE11_START)):
        with Locations((-22.5, 6.5)):
            Circle(SKETCH6_3_R)
        with Locations((-22.5, 6.5)):
            Circle(SKETCH6_3_R_2, mode=Mode.SUBTRACT)
    # profile 4 of 4: a face of its own
    with BuildSketch(Plane.XY.offset(32).offset(BOSS_EXTRUDE11_START)):
        with Locations((-92.5, 6.5)):
            Circle(SKETCH6_3_R)
        with Locations((-92.5, 6.5)):
            Circle(SKETCH6_3_R_2, mode=Mode.SUBTRACT)
    extrude(amount=BOSS_EXTRUDE11_DEPTH)


solid = Compound([part.part, body_2.part])
